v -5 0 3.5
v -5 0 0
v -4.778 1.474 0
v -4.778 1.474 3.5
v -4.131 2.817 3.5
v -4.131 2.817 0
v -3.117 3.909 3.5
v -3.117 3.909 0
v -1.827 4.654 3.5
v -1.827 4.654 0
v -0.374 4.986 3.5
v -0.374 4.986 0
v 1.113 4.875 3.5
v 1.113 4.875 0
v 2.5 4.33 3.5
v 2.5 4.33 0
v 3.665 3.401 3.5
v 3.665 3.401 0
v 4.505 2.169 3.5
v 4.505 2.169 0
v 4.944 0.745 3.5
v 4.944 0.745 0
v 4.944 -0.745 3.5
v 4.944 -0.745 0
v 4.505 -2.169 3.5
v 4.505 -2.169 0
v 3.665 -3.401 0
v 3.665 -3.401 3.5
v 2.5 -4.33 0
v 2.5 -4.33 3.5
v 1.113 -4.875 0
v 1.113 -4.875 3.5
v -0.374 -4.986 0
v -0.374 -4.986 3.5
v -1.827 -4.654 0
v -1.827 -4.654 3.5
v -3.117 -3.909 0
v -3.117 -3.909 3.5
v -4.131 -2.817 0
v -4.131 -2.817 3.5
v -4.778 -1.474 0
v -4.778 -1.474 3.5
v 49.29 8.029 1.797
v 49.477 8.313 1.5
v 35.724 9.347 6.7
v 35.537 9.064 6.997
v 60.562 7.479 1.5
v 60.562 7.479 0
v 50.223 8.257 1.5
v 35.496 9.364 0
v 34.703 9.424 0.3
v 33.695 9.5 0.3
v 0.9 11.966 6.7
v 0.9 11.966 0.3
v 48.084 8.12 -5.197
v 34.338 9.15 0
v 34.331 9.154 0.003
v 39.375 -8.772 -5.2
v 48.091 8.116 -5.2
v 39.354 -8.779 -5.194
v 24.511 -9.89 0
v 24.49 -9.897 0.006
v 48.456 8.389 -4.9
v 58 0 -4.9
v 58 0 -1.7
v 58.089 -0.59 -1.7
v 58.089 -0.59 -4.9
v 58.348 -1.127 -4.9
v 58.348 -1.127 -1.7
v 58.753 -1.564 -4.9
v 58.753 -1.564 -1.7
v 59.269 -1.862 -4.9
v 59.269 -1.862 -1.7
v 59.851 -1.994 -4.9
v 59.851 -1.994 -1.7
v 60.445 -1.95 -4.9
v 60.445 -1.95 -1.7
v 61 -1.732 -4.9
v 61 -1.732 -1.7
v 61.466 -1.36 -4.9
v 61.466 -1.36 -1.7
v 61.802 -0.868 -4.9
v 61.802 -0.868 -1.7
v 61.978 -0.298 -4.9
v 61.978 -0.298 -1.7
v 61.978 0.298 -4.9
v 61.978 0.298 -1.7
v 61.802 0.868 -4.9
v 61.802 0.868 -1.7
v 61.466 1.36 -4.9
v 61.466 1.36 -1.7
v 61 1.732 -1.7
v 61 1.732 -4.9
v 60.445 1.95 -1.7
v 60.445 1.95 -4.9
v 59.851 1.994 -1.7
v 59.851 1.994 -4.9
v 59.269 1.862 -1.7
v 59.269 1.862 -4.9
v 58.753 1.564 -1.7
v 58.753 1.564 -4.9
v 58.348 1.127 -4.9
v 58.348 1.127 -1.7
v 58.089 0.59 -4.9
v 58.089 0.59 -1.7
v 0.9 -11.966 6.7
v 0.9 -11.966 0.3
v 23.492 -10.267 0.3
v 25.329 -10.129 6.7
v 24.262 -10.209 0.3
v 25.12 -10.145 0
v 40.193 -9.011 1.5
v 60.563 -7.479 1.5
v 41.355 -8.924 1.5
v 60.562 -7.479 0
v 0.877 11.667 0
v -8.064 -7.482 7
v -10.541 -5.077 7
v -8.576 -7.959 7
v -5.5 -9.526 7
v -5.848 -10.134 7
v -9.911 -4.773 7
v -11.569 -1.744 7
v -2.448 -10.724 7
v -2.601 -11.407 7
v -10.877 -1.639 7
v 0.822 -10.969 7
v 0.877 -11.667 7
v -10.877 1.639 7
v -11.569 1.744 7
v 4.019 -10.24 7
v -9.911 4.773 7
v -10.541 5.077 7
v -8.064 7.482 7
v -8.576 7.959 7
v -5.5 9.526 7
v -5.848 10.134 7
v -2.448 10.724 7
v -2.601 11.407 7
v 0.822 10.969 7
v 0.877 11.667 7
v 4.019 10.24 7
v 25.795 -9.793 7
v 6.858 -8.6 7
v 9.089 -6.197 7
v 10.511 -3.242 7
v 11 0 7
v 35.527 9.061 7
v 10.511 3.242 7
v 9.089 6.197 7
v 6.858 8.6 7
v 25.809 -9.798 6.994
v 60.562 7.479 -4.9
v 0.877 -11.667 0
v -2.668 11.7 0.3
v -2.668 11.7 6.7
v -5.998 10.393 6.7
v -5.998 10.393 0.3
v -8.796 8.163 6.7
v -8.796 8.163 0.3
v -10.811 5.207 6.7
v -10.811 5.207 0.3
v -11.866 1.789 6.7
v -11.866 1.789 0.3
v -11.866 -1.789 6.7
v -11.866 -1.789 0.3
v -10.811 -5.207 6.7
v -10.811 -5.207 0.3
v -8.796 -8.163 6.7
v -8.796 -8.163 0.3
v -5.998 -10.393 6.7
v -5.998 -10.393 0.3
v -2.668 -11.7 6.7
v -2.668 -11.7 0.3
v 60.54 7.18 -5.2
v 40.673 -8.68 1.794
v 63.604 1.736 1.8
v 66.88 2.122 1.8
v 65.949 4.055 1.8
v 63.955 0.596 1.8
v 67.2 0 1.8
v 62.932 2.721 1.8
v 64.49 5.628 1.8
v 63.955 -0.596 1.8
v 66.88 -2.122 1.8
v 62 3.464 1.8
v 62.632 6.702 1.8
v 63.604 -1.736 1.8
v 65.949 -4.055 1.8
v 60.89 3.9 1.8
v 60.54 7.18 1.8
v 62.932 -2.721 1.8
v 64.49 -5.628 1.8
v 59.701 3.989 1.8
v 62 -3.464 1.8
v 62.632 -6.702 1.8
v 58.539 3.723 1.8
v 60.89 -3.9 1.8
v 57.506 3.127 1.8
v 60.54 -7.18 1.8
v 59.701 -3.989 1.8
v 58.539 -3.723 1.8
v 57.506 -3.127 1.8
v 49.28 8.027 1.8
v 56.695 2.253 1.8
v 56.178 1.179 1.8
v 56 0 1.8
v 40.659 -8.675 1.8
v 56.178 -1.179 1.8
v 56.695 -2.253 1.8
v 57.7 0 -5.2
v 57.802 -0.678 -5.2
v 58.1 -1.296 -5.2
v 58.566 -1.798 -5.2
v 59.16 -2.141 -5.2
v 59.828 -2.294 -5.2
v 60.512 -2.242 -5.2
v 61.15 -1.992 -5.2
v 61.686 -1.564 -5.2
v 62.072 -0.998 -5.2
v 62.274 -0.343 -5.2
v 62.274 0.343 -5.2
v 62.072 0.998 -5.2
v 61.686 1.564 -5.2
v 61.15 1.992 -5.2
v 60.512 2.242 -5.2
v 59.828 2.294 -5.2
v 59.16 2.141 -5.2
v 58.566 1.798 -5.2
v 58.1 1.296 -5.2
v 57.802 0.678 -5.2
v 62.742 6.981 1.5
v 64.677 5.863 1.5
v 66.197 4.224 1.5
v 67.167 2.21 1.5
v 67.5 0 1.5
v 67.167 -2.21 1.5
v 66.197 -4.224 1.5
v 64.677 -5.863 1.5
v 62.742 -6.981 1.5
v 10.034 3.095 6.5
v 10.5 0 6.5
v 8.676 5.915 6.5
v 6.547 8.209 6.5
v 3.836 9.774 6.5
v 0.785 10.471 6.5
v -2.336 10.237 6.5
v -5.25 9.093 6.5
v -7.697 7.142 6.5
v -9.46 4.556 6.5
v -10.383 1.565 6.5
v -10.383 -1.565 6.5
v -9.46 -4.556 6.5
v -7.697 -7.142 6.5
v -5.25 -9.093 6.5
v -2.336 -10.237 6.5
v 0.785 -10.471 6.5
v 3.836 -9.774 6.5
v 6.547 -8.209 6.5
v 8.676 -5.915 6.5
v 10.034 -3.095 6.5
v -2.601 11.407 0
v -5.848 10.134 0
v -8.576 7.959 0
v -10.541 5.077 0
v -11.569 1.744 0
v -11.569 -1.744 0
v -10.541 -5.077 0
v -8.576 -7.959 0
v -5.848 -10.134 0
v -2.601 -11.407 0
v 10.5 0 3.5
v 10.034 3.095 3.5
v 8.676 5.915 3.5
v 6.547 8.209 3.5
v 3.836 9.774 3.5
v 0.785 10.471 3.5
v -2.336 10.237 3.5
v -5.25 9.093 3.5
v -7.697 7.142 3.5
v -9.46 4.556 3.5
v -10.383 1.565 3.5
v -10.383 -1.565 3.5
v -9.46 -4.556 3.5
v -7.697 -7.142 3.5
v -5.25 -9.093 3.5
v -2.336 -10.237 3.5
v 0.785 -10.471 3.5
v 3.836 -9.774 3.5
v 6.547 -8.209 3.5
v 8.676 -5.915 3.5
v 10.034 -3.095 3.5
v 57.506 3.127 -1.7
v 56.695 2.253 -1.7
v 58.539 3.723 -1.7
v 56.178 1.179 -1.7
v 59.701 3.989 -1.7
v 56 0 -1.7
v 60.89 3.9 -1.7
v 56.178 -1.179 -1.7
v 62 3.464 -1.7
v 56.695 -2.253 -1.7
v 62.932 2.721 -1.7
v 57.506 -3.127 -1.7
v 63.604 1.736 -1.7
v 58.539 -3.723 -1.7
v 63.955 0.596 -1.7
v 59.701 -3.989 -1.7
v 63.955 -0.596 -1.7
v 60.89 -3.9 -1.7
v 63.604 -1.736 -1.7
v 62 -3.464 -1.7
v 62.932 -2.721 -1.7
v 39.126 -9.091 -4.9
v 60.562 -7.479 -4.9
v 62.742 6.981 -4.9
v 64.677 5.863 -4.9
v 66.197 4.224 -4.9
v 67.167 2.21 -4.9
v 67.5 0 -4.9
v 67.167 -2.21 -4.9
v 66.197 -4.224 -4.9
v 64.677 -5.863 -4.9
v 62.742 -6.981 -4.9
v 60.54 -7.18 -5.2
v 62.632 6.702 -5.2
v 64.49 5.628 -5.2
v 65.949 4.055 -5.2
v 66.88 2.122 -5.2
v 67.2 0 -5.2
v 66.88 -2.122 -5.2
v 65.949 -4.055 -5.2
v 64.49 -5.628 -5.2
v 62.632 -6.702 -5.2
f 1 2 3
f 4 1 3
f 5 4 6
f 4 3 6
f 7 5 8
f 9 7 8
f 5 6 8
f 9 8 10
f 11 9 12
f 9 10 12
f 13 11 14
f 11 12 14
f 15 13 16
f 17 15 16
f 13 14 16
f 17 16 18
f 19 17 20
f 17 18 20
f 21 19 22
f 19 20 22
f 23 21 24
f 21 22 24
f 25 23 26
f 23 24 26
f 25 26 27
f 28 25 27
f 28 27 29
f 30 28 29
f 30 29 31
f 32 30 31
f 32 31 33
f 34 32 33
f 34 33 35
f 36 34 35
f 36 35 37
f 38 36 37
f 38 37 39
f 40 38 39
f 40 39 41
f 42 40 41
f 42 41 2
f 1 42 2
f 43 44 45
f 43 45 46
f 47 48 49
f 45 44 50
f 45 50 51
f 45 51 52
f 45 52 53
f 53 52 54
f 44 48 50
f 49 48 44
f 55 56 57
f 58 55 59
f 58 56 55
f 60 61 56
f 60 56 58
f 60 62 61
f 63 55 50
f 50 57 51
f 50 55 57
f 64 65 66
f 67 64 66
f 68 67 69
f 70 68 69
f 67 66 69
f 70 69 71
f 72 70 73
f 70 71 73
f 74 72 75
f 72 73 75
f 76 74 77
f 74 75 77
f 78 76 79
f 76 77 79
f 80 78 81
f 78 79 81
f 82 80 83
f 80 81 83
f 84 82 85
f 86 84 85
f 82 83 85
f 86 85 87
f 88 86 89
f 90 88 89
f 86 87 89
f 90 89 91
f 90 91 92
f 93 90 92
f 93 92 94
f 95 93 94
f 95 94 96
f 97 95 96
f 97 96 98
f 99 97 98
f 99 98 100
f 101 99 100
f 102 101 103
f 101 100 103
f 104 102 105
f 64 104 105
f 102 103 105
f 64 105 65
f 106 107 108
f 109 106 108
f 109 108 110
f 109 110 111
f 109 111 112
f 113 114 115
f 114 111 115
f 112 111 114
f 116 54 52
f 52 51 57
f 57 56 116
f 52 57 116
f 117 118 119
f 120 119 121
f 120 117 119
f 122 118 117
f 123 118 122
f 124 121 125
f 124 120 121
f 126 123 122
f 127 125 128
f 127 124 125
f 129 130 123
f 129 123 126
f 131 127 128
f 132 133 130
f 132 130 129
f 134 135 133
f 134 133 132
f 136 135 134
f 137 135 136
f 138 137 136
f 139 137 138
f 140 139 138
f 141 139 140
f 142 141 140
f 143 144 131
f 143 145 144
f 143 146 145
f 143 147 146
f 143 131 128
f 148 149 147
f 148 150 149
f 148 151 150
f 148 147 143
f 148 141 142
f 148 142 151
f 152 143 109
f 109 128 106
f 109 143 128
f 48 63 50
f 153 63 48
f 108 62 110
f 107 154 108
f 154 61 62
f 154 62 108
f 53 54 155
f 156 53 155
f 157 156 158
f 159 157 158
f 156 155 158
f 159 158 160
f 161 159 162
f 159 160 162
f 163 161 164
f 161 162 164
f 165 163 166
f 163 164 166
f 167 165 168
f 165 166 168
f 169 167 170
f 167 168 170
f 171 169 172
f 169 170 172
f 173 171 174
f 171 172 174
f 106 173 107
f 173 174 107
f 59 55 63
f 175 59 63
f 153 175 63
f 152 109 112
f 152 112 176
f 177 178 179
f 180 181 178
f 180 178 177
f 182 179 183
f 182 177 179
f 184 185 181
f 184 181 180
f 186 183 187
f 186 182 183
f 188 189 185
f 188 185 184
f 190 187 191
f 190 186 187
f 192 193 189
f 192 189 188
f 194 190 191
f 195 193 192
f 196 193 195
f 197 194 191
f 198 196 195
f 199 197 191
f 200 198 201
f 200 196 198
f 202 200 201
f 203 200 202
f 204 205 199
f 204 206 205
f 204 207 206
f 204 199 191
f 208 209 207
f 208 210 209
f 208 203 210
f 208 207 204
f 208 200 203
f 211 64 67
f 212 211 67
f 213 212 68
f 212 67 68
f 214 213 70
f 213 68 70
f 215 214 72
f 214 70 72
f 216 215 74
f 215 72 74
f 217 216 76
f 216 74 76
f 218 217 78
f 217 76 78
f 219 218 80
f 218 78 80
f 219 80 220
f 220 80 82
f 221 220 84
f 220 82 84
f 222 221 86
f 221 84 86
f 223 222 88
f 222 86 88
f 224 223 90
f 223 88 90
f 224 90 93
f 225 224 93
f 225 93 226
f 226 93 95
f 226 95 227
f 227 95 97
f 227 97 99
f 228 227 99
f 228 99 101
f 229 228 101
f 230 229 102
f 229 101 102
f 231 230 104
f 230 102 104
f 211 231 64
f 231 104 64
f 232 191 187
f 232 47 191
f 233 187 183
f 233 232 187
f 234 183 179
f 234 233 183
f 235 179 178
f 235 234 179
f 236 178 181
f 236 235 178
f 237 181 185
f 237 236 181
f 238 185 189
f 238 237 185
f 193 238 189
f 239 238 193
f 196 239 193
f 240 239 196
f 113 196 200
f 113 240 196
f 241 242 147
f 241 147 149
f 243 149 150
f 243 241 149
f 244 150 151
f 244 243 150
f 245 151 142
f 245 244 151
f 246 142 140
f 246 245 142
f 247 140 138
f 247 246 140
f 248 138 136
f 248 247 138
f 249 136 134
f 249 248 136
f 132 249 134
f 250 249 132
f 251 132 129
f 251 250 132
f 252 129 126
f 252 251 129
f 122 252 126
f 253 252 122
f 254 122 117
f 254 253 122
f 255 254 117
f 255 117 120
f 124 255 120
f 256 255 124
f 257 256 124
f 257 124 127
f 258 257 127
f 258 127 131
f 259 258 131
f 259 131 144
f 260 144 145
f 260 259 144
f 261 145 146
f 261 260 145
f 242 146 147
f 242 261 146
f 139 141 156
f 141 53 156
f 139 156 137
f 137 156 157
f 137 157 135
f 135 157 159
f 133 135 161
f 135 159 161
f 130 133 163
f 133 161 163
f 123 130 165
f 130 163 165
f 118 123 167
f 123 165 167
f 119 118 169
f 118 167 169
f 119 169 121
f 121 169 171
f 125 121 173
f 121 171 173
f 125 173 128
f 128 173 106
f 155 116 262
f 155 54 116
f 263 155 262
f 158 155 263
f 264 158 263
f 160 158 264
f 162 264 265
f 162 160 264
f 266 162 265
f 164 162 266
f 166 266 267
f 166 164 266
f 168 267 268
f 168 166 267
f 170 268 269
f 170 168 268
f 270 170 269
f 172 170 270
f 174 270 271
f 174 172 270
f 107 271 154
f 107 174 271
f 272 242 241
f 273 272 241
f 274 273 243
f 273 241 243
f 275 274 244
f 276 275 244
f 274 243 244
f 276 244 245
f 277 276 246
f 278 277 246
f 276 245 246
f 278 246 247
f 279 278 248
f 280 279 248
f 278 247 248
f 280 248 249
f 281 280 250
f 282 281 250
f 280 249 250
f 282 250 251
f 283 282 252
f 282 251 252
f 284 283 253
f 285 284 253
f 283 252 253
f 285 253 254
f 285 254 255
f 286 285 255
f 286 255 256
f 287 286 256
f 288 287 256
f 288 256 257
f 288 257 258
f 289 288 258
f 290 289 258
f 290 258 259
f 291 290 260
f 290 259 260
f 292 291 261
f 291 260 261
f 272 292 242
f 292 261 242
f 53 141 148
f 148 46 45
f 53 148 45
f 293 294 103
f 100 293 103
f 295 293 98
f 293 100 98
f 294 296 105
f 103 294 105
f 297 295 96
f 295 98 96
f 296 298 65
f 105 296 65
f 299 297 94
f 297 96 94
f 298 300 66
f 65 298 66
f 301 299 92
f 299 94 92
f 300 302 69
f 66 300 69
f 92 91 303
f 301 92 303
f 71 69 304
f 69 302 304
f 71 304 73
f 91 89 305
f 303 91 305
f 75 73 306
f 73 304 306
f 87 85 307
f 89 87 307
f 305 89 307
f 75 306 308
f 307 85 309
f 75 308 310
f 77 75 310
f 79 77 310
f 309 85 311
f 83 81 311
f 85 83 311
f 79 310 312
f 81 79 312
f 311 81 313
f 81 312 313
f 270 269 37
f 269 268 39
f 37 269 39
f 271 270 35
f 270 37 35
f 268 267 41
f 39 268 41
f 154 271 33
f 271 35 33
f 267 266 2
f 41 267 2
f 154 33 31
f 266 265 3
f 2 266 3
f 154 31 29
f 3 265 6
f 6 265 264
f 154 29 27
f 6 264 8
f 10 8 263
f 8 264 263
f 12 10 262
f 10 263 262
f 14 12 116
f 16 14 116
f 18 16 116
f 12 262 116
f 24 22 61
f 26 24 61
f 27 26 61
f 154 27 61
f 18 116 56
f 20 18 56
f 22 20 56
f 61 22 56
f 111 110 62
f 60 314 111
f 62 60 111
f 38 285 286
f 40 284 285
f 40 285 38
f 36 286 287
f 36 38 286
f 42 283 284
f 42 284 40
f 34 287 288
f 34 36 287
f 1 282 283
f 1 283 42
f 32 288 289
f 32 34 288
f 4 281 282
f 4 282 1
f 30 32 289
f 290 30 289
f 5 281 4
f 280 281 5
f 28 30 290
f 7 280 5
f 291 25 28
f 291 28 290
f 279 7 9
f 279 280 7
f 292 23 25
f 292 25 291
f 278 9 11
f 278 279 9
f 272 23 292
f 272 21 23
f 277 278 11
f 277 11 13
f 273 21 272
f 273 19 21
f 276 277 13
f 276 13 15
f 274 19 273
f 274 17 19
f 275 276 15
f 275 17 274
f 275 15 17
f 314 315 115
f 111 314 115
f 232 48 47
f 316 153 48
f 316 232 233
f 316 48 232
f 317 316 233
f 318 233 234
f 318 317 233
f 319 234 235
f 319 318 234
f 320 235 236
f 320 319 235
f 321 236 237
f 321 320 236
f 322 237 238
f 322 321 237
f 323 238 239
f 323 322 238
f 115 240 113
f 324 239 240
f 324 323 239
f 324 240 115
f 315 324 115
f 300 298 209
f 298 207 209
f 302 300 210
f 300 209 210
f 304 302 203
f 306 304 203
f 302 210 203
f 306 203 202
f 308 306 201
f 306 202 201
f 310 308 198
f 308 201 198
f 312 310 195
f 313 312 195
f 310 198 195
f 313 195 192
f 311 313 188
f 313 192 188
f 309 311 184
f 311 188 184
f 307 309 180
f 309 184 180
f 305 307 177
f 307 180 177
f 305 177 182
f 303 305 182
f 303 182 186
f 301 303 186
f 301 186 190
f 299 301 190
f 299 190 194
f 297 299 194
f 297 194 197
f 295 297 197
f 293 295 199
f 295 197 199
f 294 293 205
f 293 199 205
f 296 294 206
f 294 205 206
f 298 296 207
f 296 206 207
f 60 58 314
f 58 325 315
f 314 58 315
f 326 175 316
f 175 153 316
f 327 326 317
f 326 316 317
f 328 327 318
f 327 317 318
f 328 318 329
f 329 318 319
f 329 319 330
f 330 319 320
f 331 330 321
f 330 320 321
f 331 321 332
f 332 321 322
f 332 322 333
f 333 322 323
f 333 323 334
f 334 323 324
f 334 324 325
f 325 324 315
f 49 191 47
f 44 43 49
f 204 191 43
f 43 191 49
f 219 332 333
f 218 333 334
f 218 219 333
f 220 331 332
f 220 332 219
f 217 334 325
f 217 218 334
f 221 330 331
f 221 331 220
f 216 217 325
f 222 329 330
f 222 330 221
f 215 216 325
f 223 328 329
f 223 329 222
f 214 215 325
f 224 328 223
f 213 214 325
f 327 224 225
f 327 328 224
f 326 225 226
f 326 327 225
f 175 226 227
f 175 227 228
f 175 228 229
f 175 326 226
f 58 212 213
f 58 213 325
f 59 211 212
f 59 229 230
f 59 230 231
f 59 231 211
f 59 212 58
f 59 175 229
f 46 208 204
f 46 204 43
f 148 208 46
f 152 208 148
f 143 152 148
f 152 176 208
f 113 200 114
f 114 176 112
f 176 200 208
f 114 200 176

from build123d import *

# Parameters (mm, degrees)
EXTRUDE_1_DEPTH     = 7
SKETCH_2_R          = 10.5
CUT_EXTRUDE_1_DEPTH = 3.5
SKETCH_3_R          = 5
CUT_EXTRUDE_2_DEPTH = 69.914802474
EXTRUDE_START       = 5.2
EXTRUDE_2_DEPTH     = 5.2
CUT_EXTRUDE_START   = -10.220454921
CUT_EXTRUDE_3_DEPTH = 45.240565609
CHAMFER_1_SIZE      = 0.5
CHAMFER_2_SIZE      = 0.3
CHAMFER_3_SIZE      = 0.3
CHAMFER_3_SIZE_2    = 0.254518099
CHAMFER_3_SIZE_3    = 0.383899621
CHAMFER_3_SIZE_4    = 0.356772393
CHAMFER_3_SIZE_5    = 0.263835418


with BuildPart() as part:
    # 草图1 → 凸台-拉伸1 (new body)
    with BuildSketch(Plane.XY):
        with BuildLine():
            Line((0.9, -11.966202405), (60.5625, -7.478876503))
            ThreePointArc((60.5625, -7.478876503), (67.5, 0), (60.5625, 7.478876503))
            Line((60.5625, 7.478876503), (0.9, 11.966202405))
            ThreePointArc((0.9, 11.966202405), (-12, 0), (0.9, -11.966202405))
        make_face()
    extrude(amount=EXTRUDE_1_DEPTH)

    # 草图2 → 切除-拉伸1 (cut)
    with BuildSketch(Plane.XY.offset(7)):
        Circle(SKETCH_2_R)
    extrude(amount=-CUT_EXTRUDE_1_DEPTH, mode=Mode.SUBTRACT)

    # 草图3 → 切除-拉伸2 (cut, through all)
    with BuildSketch(Plane(origin=(0, 0, 0), x_dir=(-1, 0, 0), z_dir=(0, 0, -1))):
        Circle(SKETCH_3_R)
    extrude(amount=-CUT_EXTRUDE_2_DEPTH, mode=Mode.SUBTRACT)

    # 草图4 → 凸台-拉伸2 (add)
    with BuildSketch(Plane(origin=(0, 0, 0), x_dir=(-1, 0, 0), z_dir=(0, 0, -1)).offset(EXTRUDE_START)):
        with BuildLine():
            Line((-24.349176843, -10.202546866), (-34.487976367, 9.439989183))
            Line((-34.487976367, 9.439989183), (-60.5625, 7.478876503))
            ThreePointArc((-60.5625, 7.478876503), (-67.5, 0), (-60.5625, -7.478876503))
            Line((-60.5625, -7.478876503), (-24.349176843, -10.202546866))
        make_face()
    extrude(amount=-EXTRUDE_2_DEPTH)

    # 切除-拉伸3: read off the stored shape, not the designer's step
    # 切除-拉伸3 outline → 切除-拉伸3 (cut)
    with BuildSketch(Plane(origin=(0, 0, 0), x_dir=(0.8886074479712769, -0.45866851146549686, 0), z_dir=(0.45866851146549686, 0.8886074479712767, 0)).offset(CUT_EXTRUDE_START)):
        Polygon((26.316446878, 5.2), (26.316446878, 0), (39.011877148, 5.2), align=None)
        Polygon((62, -7), (62, -1.8), (40.108675427, -1.8), (27.413245157, -7), align=None)
    extrude(amount=CUT_EXTRUDE_3_DEPTH, mode=Mode.SUBTRACT)

    # 草图6 → 切除-旋转1 (revolve, cut)
    with BuildSketch(Plane(origin=(0, 0, 0), x_dir=(1, 0, 0), z_dir=(0, 1, 0))):
        Polygon((60, 5.2), (58, 5.2), (58, 1.7), (56, 1.7), (56, -1.8), (60, -1.8), align=None)
    revolve(axis=Axis((60, 0, -13.45), (0, 0, 1)), mode=Mode.SUBTRACT)

    # 倒角1
    chamfer_1_edges = [part.edges().sort_by_distance(p)[0] for p in [
        (-10.5, 0, 7),
    ]]
    chamfer(chamfer_1_edges, length=CHAMFER_1_SIZE)

    # 倒角2
    chamfer_2_edges = [part.edges().sort_by_distance(p)[0] for p in [
        (62, 0, -5.2),
    ]]
    chamfer(chamfer_2_edges, length=CHAMFER_2_SIZE)

    # 倒角3
    # the kernel refuses this chamfer: 0.383899621, 0.356772393, 0.3, 0.263835418, 0.254518099 mm, written as the material it takes off along each edge
    with BuildSketch(Plane(origin=(60.5625, -7.478876503, -5.2), x_dir=(-0.07499999999999998, 0.9971835337589565, 0), z_dir=(-0.9971835337589565, -0.07499999999999998, 0))) as chamfer_3_piece_1:
        Polygon((CHAMFER_3_SIZE, 0), (0, -CHAMFER_3_SIZE), (0, 0), align=None)
    extrude(amount=22.721254915, mode=Mode.SUBTRACT)
    with BuildSketch(Plane(origin=(60, 0, -5.2), x_dir=(0.07499999999999998, 0.9971835337589565, 0), z_dir=(-0.9971835337589565, 0.07499999999999998, 0))) as chamfer_3_piece_2:
        Polygon((7.5 - CHAMFER_3_SIZE, 0), (7.5, -CHAMFER_3_SIZE), (7.5, 0), align=None)
    revolve(axis=Axis((60, 0, -5.2), (0, 0, -1)), revolution_arc=171.397555391, mode=Mode.SUBTRACT)
    with BuildSketch(Plane(origin=(46.933080248, 8.503970126, -5.2), x_dir=(-0.07499999999999997, -0.9971835337589565, 0), z_dir=(0.9971835337589565, -0.07499999999999997, 0))) as chamfer_3_piece_3:
        Polygon((CHAMFER_3_SIZE, 0), (0, -CHAMFER_3_SIZE), (0, 0), align=None)
    extrude(amount=13.667914973, mode=Mode.SUBTRACT)
    # the kernel refuses this chamfer: 0.383899621, 0.356772393, 0.3, 0.263835418, 0.254518099 mm, written as the material it takes off along each edge
    with BuildSketch(Plane(origin=(0.9, -11.966202405, 0), x_dir=(-0.07499999999999997, 0.9971835337589565, 0), z_dir=(0.9971835337589566, 0.07499999999999997, 0))) as chamfer_3_2_piece_1_section:
        Polygon((CHAMFER_3_SIZE, 0), (0, CHAMFER_3_SIZE), (0, 0), align=None)
    chamfer_3_2_piece_1 = extrude(amount=24.286912089, mode=Mode.PRIVATE)
    chamfer_3_2_piece_1 = split(chamfer_3_2_piece_1, bisect_by=Plane(origin=(3.45685625, -13.285963401, 7.024904811), z_dir=(-0.33681186979171107, 0.17385066860959783, -0.9253830068633244)), keep=Keep.TOP, mode=Mode.PRIVATE)
    add(chamfer_3_2_piece_1, mode=Mode.SUBTRACT)
    with BuildSketch(Plane(origin=(35.257308346, 9.382126316, 0), x_dir=(0, 0, 1), z_dir=(-0.9971835337589566, 0.075, 0))) as chamfer_3_2_piece_2_section:
        Polygon((CHAMFER_3_SIZE, 0), (0, -CHAMFER_3_SIZE), (0, 0), align=None)
    chamfer_3_2_piece_2 = extrude(amount=34.454347854, mode=Mode.PRIVATE)
    chamfer_3_2_piece_2 = split(chamfer_3_2_piece_2, bisect_by=Plane(origin=(35.166645448, 9.428923377, -0.249094265), z_dir=(-0.33681186979171107, 0.17385066860959783, -0.9253830068633244)), keep=Keep.TOP, mode=Mode.PRIVATE)
    add(chamfer_3_2_piece_2, mode=Mode.SUBTRACT)
    with BuildSketch(Plane(origin=(0, 0, 0), x_dir=(0.07500000000000011, 0.9971835337589566, 0), z_dir=(0.9971835337589566, -0.07500000000000011, 0))) as chamfer_3_2_piece_3:
        Polygon((12 - CHAMFER_3_SIZE, 0), (12, CHAMFER_3_SIZE), (12, 0), align=None)
    revolve(axis=Axis((0, 0, 0), (0, 0, 1)), revolution_arc=188.602444609, mode=Mode.SUBTRACT)
    # the kernel refuses this chamfer: 0.383899621, 0.356772393, 0.3, 0.263835418, 0.254518099 mm, written as the material it takes off along each edge
    with BuildSketch(Plane(origin=(39.590447843, -9.056222958, -5.332010389), x_dir=(0.3284593891924205, 0.024704032262311923, 0.9441949695064703), z_dir=(-0.9415356762498924, -0.07081462271298539, 0.3293870968308798))) as chamfer_3_3_piece_1_section:
        Polygon((CHAMFER_3_SIZE_2 * 0.999999998644, 0), (CHAMFER_3_SIZE * 0.198621914305, CHAMFER_3_SIZE * 0.980076188446), (0, 0), align=None)
    chamfer_3_3_piece_1 = extrude(amount=17.869959702, mode=Mode.PRIVATE)
    chamfer_3_3_piece_1 = split(chamfer_3_3_piece_1, bisect_by=Plane(origin=(39.379247454, -6.248148947, -2.516005194), z_dir=(0.05303300858899107, -0.7051152388085232, -0.7071067811865471)), keep=Keep.TOP, mode=Mode.PRIVATE)
    add(chamfer_3_3_piece_1, mode=Mode.SUBTRACT)
    # the kernel refuses this chamfer: 0.383899621, 0.356772393, 0.3, 0.263835418, 0.254518099 mm, written as the material it takes off along each edge
    with BuildSketch(Plane(origin=(39.727912607, -9.045883981, 1.8), x_dir=(-0.07499999999999996, 0.9971835337589565, 0), z_dir=(0.9971835337589566, 0.07499999999999997, 0))) as chamfer_3_4_piece_1_section:
        Polygon((CHAMFER_3_SIZE, 0), (0, -CHAMFER_3_SIZE), (0, 0), align=None)
    chamfer_3_4_piece_1 = extrude(amount=20.893433042, mode=Mode.PRIVATE)
    chamfer_3_4_piece_1 = split(chamfer_3_4_piece_1, bisect_by=Plane(origin=(39.811799189, -9.089183341, 2.030476488), z_dir=(0.33681186979171107, -0.17385066860959783, 0.9253830068633244)), keep=Keep.TOP, mode=Mode.PRIVATE)
    add(chamfer_3_4_piece_1, mode=Mode.SUBTRACT)
    with BuildSketch(Plane(origin=(60, 0, 1.8), x_dir=(0.075, 0.9971835337589565, 0), z_dir=(-0.9971835337589565, 0.075, 0))) as chamfer_3_4_piece_2:
        Polygon((7.5 - CHAMFER_3_SIZE, 0), (7.5, CHAMFER_3_SIZE), (7.5, 0), align=None)
    revolve(axis=Axis((60, 0, 1.8), (0, 0, -1)), revolution_arc=171.397555391, mode=Mode.SUBTRACT)
    with BuildSketch(Plane(origin=(60.5625, 7.478876503, 1.8), x_dir=(-0.07499999999999998, -0.9971835337589565, 0), z_dir=(-0.9971835337589566, 0.075, 0))) as chamfer_3_4_piece_3_section:
        Polygon((CHAMFER_3_SIZE, 0), (0, -CHAMFER_3_SIZE), (0, 0), align=None)
    chamfer_3_4_piece_3 = extrude(amount=11.936343353, mode=Mode.PRIVATE)
    chamfer_3_4_piece_3 = split(chamfer_3_4_piece_3, bisect_by=Plane(origin=(59.250471243, 8.156100488, -1.804769384), z_dir=(0.33681186979171107, -0.17385066860959783, 0.9253830068633244)), keep=Keep.TOP, mode=Mode.PRIVATE)
    add(chamfer_3_4_piece_3, mode=Mode.SUBTRACT)
    # the kernel refuses this chamfer: 0.383899621, 0.356772393, 0.3, 0.263835418, 0.254518099 mm, written as the material it takes off along each edge
    with BuildSketch(Plane(origin=(42.288756392, -8.85327823, 1.173257023), x_dir=(-0.3284593891924201, -0.02470403226231695, -0.9441949695064704), z_dir=(-0.9415356762498924, -0.07081462271298539, 0.3293870968308797))) as chamfer_3_5_piece_1_section:
        Polygon((CHAMFER_3_SIZE_3 * 1.0000000011, 0), (-CHAMFER_3_SIZE * 0.198621914305, -CHAMFER_3_SIZE * 0.980076188446), (0, 0), align=None)
    chamfer_3_5_piece_1 = extrude(amount=19.376005008, mode=Mode.PRIVATE)
    chamfer_3_5_piece_1 = split(chamfer_3_5_piece_1, bisect_by=Plane(origin=(42.301009253, -9.016189588, 1.336628512), z_dir=(0.053033008588990585, -0.7051152388085168, 0.7071067811865535)), keep=Keep.TOP, mode=Mode.PRIVATE)
    add(chamfer_3_5_piece_1, mode=Mode.SUBTRACT)
    # the kernel refuses this chamfer: 0.383899621, 0.356772393, 0.3, 0.263835418, 0.254518099 mm, written as the material it takes off along each edge
    with BuildSketch(Plane(origin=(0.9, -11.966202405, 7), x_dir=(-0.07499999999999997, 0.9971835337589565, 0), z_dir=(0.9971835337589566, 0.07499999999999997, 0))) as chamfer_3_6_piece_1:
        Polygon((CHAMFER_3_SIZE, 0), (0, -CHAMFER_3_SIZE), (0, 0), align=None)
    extrude(amount=25.952193485, mode=Mode.SUBTRACT)
    with BuildSketch(Plane(origin=(36.984003052, 9.252258445, 7), x_dir=(-0.075, -0.9971835337589565, 0), z_dir=(-0.9971835337589566, 0.075, 0))) as chamfer_3_6_piece_2:
        Polygon((CHAMFER_3_SIZE, 0), (0, -CHAMFER_3_SIZE), (0, 0), align=None)
    extrude(amount=36.185919473, mode=Mode.SUBTRACT)
    with BuildSketch(Plane(origin=(0, 0, 7), x_dir=(0.07500000000000011, 0.9971835337589566, 0), z_dir=(0.9971835337589566, -0.07500000000000011, 0))) as chamfer_3_6_piece_3:
        Polygon((12 - CHAMFER_3_SIZE, 0), (12, -CHAMFER_3_SIZE), (12, 0), align=None)
    revolve(axis=Axis((0, 0, 7), (0, 0, 1)), revolution_arc=188.602444609, mode=Mode.SUBTRACT)
    # the kernel refuses this chamfer: 0.383899621, 0.356772393, 0.3, 0.263835418, 0.254518099 mm, written as the material it takes off along each edge
    with BuildSketch(Plane(origin=(32.83531163, 9.564289125, 0.624872862), x_dir=(-0.12627439013591127, -0.9822683171715932, -0.13857752875805598), z_dir=(0.9330662049196804, -0.07017761826168661, -0.3527925156971192))) as chamfer_3_7_piece_1_section:
        Polygon((CHAMFER_3_SIZE, 0), (-CHAMFER_3_SIZE_4 * 0.148100133729, -CHAMFER_3_SIZE_4 * 0.988972370164), (0, 0), align=None)
    chamfer_3_7_piece_1 = extrude(amount=17.22586636, mode=Mode.PRIVATE)
    chamfer_3_7_piece_1 = split(chamfer_3_7_piece_1, bisect_by=Plane(origin=(32.847494362, 9.72626806, 0.462436431), z_dir=(0.05303300858899109, 0.7051152388085231, -0.7071067811865475)), keep=Keep.TOP, mode=Mode.PRIVATE)
    add(chamfer_3_7_piece_1, mode=Mode.SUBTRACT)
    # the kernel refuses this chamfer: 0.383899621, 0.356772393, 0.3, 0.263835418, 0.254518099 mm, written as the material it takes off along each edge
    with BuildSketch(Plane(origin=(35.245808416, 9.382991247, 7.162707961), x_dir=(-0.351798887486564, 0.026459438677302174, -0.935701576822492), z_dir=(0.9330662049196804, -0.07017761826168642, -0.35279251569711917))) as chamfer_3_8_piece_1_section:
        Polygon((CHAMFER_3_SIZE_5 * 1.00000000141, 0), (CHAMFER_3_SIZE * 0.148100133836, -CHAMFER_3_SIZE * 0.988972370877), (0, 0), align=None)
    chamfer_3_8_piece_1 = extrude(amount=16.82260493, mode=Mode.PRIVATE)
    chamfer_3_8_piece_1 = split(chamfer_3_8_piece_1, bisect_by=Plane(origin=(35.033456868, 6.559611679, 4.33135398), z_dir=(0.05303300858899218, 0.7051152388085377, 0.7071067811865327)), keep=Keep.TOP, mode=Mode.PRIVATE)
    add(chamfer_3_8_piece_1, mode=Mode.SUBTRACT)


solid = part.part
